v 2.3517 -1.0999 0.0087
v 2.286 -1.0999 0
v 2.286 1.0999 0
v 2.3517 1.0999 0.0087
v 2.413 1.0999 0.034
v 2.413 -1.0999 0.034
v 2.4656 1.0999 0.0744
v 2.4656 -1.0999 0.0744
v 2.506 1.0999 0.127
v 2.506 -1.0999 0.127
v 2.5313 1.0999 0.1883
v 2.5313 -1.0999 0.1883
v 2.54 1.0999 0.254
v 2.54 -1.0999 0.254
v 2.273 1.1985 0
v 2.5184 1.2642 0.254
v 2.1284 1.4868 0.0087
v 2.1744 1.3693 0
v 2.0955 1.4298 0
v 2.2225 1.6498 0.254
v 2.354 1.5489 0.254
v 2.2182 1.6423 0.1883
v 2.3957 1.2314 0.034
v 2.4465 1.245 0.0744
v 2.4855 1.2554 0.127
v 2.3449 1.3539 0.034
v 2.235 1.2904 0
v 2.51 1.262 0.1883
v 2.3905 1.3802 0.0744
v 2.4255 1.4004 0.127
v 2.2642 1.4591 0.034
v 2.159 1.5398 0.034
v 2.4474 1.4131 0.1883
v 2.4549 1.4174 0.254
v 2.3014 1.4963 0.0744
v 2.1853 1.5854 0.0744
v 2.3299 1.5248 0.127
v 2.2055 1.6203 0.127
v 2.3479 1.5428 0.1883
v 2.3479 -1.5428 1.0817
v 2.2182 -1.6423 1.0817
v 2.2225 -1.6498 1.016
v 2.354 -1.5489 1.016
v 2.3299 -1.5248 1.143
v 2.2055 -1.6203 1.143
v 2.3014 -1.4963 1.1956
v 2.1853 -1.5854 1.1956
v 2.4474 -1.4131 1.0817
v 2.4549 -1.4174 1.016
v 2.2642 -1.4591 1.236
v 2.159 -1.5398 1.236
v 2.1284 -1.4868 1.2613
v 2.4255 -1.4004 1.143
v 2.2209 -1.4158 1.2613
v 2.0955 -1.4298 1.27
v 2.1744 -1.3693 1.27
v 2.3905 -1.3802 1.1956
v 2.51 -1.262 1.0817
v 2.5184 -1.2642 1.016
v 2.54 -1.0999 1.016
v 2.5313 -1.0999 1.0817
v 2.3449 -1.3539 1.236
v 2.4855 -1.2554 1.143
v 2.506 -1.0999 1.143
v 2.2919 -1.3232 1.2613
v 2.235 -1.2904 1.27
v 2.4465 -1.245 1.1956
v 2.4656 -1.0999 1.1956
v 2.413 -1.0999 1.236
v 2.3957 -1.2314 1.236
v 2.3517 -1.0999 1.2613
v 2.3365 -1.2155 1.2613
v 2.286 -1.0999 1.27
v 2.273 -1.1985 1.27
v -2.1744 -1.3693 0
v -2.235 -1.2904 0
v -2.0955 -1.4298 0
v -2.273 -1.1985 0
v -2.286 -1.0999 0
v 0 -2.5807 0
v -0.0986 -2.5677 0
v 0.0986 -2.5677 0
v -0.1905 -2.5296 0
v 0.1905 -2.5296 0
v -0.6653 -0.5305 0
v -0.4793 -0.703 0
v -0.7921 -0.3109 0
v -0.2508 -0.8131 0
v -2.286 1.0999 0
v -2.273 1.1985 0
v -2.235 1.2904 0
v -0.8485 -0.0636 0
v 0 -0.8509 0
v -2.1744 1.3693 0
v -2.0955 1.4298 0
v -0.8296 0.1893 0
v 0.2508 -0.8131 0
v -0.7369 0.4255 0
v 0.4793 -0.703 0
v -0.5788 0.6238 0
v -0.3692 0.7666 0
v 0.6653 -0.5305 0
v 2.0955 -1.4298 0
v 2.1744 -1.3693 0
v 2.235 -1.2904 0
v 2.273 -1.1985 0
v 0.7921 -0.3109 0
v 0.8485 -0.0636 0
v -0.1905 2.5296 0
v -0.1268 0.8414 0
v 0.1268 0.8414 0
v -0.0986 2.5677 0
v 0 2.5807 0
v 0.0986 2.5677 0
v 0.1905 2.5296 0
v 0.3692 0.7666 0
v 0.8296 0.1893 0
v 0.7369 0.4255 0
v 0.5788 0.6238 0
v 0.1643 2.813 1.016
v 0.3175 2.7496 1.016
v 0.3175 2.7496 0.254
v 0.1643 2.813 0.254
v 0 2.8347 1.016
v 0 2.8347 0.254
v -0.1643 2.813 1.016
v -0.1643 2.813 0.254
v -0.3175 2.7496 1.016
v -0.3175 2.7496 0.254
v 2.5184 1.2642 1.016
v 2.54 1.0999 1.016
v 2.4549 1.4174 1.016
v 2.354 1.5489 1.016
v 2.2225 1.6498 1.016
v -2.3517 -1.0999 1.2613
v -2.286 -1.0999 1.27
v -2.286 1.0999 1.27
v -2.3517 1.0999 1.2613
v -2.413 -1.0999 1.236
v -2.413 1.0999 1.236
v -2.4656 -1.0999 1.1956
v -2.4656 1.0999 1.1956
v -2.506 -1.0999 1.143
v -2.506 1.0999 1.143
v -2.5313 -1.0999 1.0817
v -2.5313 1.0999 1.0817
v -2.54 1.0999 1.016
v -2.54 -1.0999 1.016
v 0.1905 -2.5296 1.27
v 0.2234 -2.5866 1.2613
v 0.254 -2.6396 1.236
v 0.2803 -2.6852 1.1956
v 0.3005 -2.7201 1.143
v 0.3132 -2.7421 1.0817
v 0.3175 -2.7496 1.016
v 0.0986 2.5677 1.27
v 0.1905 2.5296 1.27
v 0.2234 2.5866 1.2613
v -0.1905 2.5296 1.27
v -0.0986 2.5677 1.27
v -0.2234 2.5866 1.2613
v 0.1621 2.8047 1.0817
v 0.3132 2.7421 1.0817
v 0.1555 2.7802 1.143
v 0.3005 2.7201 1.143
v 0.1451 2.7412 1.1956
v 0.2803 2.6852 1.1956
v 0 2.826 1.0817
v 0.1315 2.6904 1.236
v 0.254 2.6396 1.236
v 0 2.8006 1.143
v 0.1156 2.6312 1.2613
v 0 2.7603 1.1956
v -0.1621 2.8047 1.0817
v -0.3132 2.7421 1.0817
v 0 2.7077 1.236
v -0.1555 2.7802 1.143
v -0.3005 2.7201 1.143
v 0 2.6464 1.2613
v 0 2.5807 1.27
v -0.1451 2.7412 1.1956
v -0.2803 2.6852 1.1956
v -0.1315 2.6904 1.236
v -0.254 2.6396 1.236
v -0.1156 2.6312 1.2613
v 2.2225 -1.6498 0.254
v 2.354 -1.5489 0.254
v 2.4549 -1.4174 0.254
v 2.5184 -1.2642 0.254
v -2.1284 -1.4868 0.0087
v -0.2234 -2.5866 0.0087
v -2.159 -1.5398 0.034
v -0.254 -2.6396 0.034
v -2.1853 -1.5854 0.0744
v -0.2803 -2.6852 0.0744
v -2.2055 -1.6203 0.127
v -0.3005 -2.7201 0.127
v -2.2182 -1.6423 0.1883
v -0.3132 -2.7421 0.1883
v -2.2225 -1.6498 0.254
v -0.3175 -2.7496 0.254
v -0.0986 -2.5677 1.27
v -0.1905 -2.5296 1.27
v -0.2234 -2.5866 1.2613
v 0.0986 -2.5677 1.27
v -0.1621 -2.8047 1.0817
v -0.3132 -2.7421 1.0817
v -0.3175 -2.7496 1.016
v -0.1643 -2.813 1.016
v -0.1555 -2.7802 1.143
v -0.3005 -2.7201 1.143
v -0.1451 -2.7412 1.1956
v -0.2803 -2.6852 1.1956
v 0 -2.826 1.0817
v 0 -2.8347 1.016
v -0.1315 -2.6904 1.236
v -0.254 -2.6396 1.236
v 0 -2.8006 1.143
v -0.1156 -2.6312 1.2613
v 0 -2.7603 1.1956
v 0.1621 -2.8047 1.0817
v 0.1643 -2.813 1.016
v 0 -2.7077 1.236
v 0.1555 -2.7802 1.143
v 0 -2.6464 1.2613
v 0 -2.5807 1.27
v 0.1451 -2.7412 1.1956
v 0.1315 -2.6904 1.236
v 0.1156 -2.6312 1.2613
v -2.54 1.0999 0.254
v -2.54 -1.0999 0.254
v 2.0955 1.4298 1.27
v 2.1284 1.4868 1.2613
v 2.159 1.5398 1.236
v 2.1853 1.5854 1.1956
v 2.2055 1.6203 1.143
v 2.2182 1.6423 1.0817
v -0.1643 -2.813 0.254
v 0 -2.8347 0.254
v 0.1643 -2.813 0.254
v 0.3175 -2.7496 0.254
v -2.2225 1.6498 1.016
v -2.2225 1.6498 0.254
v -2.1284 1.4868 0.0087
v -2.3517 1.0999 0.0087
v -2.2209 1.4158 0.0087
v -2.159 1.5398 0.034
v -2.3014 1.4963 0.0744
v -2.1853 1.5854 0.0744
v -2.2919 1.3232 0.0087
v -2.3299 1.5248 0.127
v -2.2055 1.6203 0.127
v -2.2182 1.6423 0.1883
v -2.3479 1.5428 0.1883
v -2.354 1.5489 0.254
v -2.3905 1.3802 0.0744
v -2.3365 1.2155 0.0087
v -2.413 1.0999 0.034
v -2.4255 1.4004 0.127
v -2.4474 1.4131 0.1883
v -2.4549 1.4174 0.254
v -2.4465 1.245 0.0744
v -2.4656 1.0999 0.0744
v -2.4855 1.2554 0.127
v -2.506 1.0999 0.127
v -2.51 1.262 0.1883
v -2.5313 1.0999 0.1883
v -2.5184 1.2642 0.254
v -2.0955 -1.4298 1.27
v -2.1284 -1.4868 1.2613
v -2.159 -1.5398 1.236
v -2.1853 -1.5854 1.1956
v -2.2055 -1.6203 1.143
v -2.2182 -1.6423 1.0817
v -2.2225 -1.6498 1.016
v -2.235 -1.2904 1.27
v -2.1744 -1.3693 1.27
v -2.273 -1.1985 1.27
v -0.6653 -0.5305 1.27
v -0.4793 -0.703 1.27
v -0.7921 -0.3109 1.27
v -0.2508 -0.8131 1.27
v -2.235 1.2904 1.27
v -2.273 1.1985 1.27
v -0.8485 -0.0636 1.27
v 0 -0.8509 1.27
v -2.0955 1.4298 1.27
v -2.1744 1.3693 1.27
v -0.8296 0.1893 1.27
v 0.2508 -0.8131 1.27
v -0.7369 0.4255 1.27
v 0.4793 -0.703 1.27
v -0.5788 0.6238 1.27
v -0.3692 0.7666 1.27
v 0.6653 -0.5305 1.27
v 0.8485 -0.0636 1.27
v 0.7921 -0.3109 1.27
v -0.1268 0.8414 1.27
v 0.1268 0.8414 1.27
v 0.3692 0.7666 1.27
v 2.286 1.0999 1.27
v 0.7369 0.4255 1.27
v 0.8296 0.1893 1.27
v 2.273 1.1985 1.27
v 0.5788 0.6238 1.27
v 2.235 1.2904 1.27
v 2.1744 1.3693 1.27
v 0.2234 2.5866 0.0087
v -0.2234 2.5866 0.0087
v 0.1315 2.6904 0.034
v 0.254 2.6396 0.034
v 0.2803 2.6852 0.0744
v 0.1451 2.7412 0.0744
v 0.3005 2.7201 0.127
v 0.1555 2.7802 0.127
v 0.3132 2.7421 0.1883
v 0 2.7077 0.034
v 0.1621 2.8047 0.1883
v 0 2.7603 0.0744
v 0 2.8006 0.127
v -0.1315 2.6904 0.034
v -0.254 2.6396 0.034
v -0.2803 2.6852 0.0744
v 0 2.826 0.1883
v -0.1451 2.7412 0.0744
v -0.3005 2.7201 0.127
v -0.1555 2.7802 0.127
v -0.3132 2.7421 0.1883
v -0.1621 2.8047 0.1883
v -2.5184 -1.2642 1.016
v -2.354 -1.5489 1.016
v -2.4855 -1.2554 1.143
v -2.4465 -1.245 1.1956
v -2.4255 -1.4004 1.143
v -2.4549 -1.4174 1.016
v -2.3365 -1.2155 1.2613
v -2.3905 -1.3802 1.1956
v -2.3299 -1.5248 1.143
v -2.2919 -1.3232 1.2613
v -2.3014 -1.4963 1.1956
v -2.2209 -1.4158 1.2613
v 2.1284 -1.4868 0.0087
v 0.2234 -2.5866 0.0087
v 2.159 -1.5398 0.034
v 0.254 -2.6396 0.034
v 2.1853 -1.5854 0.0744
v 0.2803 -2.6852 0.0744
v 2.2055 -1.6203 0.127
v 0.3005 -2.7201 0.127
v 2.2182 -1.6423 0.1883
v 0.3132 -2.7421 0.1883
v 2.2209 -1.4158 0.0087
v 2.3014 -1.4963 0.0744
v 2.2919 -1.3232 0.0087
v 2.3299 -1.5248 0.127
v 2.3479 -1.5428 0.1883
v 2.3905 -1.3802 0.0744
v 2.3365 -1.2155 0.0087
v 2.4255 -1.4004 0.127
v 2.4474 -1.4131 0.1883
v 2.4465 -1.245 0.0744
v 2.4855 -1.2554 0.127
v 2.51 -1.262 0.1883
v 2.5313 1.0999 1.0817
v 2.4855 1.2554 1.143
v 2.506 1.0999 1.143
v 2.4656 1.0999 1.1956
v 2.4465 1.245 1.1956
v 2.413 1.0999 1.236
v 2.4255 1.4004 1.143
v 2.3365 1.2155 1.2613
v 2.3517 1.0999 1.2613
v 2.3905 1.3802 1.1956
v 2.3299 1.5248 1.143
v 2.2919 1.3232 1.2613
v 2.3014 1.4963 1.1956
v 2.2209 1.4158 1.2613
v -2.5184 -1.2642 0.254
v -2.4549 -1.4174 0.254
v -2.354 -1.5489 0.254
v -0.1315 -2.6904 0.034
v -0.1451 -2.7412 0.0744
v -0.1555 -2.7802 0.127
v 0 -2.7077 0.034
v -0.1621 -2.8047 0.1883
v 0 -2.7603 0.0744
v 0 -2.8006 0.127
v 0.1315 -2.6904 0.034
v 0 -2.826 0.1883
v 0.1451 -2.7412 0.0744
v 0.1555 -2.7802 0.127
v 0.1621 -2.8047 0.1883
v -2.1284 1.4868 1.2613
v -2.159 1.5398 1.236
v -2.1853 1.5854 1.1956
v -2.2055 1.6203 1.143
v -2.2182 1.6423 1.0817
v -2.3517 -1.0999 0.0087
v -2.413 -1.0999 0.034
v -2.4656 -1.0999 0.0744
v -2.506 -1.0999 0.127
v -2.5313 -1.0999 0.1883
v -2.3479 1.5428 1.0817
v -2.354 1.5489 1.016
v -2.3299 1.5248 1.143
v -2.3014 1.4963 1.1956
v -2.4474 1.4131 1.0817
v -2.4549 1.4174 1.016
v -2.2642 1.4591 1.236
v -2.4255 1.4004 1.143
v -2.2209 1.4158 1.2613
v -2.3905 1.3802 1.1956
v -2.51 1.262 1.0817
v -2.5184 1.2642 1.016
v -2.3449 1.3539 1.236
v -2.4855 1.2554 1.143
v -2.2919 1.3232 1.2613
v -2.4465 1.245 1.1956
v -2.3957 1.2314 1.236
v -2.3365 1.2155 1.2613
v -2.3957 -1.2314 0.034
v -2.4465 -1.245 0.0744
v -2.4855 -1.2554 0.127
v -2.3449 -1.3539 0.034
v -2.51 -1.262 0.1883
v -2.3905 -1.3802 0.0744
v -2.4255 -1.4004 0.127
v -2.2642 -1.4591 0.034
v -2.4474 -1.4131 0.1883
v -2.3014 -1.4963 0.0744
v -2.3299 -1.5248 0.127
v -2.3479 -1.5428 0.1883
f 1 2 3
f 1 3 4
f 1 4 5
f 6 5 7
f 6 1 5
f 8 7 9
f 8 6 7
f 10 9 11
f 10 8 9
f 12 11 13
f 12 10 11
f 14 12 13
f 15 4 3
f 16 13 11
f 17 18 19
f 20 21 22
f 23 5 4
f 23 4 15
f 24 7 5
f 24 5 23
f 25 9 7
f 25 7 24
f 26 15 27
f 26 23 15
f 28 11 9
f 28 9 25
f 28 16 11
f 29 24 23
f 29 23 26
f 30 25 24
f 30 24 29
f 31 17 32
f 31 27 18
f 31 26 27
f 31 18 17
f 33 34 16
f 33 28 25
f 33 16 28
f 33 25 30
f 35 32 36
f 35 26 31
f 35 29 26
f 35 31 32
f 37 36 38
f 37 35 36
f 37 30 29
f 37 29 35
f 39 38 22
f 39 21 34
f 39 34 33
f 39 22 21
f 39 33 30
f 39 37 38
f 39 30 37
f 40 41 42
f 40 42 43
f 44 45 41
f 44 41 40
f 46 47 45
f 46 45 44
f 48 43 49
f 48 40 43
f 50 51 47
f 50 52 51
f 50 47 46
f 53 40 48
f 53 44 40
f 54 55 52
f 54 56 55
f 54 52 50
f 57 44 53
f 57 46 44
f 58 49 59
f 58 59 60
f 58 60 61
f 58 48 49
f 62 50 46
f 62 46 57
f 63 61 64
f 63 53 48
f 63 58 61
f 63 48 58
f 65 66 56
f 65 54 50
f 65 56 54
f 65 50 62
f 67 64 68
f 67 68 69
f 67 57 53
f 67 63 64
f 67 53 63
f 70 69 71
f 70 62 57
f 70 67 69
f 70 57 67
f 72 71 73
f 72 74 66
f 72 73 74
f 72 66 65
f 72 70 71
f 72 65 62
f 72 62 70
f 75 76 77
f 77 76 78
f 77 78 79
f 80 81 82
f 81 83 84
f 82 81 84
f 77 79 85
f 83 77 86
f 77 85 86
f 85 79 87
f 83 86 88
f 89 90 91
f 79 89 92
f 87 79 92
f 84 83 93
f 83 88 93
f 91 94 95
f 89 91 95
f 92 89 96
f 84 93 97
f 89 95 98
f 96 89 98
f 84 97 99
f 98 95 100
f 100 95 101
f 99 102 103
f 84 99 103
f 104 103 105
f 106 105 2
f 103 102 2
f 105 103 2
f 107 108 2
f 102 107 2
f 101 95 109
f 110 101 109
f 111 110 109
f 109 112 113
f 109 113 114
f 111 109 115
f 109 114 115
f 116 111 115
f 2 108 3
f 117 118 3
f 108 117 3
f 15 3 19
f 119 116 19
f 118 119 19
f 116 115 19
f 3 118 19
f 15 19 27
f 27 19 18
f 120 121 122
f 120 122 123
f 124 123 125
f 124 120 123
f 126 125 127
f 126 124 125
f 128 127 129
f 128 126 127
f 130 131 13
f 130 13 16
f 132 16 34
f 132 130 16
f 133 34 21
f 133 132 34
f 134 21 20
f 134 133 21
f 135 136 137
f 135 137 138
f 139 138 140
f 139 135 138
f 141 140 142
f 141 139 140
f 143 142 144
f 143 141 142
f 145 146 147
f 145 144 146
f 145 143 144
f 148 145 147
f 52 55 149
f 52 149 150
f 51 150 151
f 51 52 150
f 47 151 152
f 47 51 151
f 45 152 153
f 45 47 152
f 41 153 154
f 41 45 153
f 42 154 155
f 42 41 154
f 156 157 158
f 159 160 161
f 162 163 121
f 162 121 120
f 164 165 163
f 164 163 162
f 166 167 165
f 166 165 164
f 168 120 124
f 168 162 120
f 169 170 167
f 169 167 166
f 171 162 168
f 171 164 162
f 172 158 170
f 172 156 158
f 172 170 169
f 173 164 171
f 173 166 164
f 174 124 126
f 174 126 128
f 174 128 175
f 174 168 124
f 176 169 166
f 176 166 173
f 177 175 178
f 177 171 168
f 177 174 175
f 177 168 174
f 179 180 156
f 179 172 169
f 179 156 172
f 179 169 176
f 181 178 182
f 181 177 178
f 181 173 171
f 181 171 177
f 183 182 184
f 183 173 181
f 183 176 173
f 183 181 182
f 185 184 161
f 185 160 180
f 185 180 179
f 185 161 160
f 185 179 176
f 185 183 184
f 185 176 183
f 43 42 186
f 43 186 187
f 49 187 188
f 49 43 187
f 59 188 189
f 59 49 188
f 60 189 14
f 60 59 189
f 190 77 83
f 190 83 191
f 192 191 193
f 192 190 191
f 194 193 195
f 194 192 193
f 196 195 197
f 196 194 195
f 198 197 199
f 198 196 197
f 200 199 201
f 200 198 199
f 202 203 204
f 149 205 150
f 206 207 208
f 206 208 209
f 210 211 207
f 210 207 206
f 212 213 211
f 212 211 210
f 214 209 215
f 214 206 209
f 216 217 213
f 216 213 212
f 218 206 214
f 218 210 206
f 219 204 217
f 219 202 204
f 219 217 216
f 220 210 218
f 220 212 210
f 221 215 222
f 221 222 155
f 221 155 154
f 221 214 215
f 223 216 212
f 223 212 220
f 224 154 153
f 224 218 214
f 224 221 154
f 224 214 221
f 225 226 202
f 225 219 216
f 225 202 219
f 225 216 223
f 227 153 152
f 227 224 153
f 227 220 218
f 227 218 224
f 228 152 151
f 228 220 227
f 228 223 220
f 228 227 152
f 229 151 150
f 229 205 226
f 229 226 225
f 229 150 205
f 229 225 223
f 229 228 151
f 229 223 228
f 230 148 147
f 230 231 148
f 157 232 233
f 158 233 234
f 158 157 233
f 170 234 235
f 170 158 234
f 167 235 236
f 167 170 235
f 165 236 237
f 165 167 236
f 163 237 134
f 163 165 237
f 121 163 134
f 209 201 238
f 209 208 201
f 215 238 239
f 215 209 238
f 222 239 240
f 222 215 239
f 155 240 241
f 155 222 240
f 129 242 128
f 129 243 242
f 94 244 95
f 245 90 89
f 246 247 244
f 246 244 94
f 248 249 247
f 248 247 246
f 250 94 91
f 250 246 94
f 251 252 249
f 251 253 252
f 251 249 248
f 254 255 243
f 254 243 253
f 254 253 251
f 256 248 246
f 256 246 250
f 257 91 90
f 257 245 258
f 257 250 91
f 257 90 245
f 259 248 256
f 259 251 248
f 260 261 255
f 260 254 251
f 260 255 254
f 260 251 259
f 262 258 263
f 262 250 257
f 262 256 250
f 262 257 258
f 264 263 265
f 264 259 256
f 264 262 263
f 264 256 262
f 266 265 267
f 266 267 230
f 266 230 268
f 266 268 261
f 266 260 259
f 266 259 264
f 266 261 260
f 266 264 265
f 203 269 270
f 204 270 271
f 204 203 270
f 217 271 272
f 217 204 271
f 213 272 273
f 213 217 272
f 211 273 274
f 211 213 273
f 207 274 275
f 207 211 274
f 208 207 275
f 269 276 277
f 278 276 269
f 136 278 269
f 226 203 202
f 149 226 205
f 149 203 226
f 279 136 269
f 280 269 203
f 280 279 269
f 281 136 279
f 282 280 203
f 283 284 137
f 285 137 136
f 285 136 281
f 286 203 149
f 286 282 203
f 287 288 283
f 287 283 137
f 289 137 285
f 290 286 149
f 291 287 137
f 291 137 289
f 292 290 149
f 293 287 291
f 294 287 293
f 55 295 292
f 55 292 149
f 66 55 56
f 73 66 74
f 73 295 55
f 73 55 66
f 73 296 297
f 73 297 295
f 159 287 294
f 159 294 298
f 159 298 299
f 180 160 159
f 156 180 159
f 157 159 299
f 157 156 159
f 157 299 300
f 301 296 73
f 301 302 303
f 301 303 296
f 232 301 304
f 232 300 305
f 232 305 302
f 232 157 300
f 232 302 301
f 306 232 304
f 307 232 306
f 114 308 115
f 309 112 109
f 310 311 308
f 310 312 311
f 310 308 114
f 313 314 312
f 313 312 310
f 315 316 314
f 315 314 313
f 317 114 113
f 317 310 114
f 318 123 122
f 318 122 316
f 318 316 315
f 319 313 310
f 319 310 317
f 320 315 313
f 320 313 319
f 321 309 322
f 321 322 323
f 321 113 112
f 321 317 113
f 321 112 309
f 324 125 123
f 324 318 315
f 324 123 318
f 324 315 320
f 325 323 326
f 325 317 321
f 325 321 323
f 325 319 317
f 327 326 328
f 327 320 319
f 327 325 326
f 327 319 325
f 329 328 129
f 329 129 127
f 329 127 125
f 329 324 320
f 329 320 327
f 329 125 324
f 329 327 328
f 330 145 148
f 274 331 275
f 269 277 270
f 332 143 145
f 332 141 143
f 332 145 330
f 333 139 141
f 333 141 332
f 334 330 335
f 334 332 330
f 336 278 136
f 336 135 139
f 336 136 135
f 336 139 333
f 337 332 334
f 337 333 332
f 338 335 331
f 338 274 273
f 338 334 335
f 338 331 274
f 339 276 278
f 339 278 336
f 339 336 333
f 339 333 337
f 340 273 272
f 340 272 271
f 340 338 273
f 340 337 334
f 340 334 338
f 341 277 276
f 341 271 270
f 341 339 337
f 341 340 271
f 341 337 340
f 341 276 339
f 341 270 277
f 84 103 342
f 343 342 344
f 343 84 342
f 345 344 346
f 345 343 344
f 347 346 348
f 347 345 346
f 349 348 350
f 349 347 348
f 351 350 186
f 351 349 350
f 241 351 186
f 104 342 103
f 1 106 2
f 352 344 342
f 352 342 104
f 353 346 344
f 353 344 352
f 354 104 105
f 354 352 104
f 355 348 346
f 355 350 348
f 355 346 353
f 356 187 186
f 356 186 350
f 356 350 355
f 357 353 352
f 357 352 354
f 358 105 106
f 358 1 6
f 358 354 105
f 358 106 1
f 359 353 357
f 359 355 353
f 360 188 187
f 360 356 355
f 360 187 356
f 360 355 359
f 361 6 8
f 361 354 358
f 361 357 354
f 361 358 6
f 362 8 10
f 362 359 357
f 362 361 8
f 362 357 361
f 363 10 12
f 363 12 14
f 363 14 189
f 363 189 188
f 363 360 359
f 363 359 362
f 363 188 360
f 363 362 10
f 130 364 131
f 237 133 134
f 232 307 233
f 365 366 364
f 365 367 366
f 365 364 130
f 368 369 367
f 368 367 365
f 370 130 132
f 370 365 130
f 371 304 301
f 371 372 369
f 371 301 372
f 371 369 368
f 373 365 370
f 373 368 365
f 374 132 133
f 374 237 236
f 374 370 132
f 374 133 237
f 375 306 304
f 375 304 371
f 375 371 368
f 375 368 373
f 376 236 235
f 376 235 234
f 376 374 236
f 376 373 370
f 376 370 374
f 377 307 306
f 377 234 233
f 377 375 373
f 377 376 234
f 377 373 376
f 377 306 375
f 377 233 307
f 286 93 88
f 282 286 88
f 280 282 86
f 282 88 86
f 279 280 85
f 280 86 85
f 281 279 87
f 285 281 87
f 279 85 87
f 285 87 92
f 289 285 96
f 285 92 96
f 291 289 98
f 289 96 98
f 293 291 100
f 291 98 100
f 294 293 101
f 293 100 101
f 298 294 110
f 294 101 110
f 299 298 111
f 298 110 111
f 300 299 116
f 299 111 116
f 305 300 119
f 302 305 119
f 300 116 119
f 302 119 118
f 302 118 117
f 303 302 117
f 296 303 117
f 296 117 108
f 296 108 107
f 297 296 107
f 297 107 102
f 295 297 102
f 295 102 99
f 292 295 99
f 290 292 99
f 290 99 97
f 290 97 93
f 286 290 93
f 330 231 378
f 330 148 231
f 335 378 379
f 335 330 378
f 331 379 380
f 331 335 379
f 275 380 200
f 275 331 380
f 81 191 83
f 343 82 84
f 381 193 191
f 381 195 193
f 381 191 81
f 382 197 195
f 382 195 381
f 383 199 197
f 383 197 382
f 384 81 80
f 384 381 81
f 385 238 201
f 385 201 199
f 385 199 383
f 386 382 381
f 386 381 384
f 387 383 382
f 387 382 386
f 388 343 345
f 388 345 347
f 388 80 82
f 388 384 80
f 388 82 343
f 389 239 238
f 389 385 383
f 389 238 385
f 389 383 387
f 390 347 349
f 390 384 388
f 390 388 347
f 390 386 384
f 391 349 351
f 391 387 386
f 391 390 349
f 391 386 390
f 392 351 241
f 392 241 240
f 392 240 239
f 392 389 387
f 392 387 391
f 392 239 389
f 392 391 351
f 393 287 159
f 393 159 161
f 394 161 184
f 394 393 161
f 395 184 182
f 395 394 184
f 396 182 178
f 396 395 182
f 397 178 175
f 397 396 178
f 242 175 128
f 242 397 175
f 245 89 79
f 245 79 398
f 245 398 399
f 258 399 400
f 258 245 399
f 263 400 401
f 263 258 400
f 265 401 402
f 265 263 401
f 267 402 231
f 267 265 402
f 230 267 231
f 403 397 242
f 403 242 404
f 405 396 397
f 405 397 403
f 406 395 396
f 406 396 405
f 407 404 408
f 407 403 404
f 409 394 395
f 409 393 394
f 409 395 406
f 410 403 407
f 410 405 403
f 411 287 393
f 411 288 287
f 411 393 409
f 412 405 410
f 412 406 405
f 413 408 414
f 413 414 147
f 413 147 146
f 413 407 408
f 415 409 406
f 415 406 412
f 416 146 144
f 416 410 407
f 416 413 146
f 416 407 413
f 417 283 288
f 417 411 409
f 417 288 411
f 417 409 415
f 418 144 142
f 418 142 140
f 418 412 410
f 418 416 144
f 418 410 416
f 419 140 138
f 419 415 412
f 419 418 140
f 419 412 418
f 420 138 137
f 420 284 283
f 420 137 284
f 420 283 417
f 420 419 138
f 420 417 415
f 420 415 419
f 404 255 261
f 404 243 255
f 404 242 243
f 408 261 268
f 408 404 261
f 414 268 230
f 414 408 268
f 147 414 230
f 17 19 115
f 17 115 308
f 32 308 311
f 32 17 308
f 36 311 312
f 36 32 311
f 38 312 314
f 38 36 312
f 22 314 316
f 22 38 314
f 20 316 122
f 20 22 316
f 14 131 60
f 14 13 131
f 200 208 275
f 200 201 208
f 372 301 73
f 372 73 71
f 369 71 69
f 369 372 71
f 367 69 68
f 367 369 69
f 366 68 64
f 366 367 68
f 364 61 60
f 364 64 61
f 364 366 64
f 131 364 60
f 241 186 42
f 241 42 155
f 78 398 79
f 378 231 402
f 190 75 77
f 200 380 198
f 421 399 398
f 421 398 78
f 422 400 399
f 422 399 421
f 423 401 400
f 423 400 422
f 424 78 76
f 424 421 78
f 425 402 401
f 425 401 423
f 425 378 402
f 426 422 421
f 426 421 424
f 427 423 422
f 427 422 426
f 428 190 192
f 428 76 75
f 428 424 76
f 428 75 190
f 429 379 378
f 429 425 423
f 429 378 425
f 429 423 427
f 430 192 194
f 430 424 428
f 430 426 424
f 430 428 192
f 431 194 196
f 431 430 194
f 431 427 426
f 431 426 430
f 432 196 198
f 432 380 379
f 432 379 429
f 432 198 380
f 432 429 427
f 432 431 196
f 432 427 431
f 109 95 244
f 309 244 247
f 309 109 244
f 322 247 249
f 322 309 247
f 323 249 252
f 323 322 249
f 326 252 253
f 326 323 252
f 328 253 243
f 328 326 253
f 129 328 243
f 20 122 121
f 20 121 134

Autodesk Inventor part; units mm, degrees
ref_plane "YZ Plane" through (0, 0, 0) normal (1, 0, 0) x (0, 1, 0)
ref_plane "XZ Plane" through (0, 0, 0) normal (0, 1, 0) x (-1, 0, 0)
ref_plane "XY Plane" through (0, 0, 0) normal (0, 0, 1) x (1, 0, 0)
sketch "Sketch1" plane through (0, 0, 0) normal (0, 0, 1) x (1, 0, 0)
  line L0 (0, 2.9329) -> (2.54, 1.4665)
  line L1 (2.54, 1.4665) -> (2.54, -1.4665)
  line L2 (2.54, -1.4665) -> (0, -2.9329)
  line L3 (0, -2.9329) -> (-2.54, -1.4665)
  line L4 (-2.54, -1.4665) -> (-2.54, 1.4665)
  line L5 (-2.54, 1.4665) -> (0, 2.9329)
  point P0 (0, 0)
  point P1 (0, 0)
  dimension "d0" = 5.08
extrude "Extrusion1" add sketch "Sketch1" along normal blind 1.27
fillet "Fillet1" radius 0.635 6 edges at (-2.54, -1.4665, 0.635) (0, -2.9329, 0.635) (2.54, -1.4665, 0.635) (-2.54, 1.4665, 0.635) (2.54, 1.4665, 0.635) (0, 2.9329, 0.635)
fillet "Fillet2" radius 0.254 12 edges at (0, 2.8347, 1.27) (-1.27, 2.1997, 1.27) (-2.4549, 1.4174, 1.27) (-2.54, 0, 1.27) (-2.4549, -1.4174, 1.27) (-1.27, -2.1997, 1.27) (0, -2.8347, 1.27) (1.27, -2.1997, 1.27) (2.4549, -1.4174, 1.27) (2.54, 0, 1.27) (2.4549, 1.4174, 1.27) (1.27, 2.1997, 1.27)
fillet "Fillet3" radius 0.254 12 edges at (2.4549, 1.4174, 0) (2.54, 0, 0) (2.4549, -1.4174, 0) (1.27, -2.1997, 0) (0, -2.8347, 0) (-1.27, -2.1997, 0) (-2.4549, -1.4174, 0) (-2.54, 0, 0) (-2.4549, 1.4174, 0) (-1.27, 2.1997, 0) (0, 2.8347, 0) (1.27, 2.1997, 0)
sketch "Sketch2" plane through (0, 0, 1.27) normal (0, 0, 1) x (1, 0, 0)
  point P0 (0, 0)
  point P1 (0, 0)
hole "Hole1" at (0, 0, 1.27) direction (0, 0, -1) diameter 1.7018 depth 6.6294 tip angle 118
properties part number "magnet_spacer_nut" material "Steel, Alloy"
